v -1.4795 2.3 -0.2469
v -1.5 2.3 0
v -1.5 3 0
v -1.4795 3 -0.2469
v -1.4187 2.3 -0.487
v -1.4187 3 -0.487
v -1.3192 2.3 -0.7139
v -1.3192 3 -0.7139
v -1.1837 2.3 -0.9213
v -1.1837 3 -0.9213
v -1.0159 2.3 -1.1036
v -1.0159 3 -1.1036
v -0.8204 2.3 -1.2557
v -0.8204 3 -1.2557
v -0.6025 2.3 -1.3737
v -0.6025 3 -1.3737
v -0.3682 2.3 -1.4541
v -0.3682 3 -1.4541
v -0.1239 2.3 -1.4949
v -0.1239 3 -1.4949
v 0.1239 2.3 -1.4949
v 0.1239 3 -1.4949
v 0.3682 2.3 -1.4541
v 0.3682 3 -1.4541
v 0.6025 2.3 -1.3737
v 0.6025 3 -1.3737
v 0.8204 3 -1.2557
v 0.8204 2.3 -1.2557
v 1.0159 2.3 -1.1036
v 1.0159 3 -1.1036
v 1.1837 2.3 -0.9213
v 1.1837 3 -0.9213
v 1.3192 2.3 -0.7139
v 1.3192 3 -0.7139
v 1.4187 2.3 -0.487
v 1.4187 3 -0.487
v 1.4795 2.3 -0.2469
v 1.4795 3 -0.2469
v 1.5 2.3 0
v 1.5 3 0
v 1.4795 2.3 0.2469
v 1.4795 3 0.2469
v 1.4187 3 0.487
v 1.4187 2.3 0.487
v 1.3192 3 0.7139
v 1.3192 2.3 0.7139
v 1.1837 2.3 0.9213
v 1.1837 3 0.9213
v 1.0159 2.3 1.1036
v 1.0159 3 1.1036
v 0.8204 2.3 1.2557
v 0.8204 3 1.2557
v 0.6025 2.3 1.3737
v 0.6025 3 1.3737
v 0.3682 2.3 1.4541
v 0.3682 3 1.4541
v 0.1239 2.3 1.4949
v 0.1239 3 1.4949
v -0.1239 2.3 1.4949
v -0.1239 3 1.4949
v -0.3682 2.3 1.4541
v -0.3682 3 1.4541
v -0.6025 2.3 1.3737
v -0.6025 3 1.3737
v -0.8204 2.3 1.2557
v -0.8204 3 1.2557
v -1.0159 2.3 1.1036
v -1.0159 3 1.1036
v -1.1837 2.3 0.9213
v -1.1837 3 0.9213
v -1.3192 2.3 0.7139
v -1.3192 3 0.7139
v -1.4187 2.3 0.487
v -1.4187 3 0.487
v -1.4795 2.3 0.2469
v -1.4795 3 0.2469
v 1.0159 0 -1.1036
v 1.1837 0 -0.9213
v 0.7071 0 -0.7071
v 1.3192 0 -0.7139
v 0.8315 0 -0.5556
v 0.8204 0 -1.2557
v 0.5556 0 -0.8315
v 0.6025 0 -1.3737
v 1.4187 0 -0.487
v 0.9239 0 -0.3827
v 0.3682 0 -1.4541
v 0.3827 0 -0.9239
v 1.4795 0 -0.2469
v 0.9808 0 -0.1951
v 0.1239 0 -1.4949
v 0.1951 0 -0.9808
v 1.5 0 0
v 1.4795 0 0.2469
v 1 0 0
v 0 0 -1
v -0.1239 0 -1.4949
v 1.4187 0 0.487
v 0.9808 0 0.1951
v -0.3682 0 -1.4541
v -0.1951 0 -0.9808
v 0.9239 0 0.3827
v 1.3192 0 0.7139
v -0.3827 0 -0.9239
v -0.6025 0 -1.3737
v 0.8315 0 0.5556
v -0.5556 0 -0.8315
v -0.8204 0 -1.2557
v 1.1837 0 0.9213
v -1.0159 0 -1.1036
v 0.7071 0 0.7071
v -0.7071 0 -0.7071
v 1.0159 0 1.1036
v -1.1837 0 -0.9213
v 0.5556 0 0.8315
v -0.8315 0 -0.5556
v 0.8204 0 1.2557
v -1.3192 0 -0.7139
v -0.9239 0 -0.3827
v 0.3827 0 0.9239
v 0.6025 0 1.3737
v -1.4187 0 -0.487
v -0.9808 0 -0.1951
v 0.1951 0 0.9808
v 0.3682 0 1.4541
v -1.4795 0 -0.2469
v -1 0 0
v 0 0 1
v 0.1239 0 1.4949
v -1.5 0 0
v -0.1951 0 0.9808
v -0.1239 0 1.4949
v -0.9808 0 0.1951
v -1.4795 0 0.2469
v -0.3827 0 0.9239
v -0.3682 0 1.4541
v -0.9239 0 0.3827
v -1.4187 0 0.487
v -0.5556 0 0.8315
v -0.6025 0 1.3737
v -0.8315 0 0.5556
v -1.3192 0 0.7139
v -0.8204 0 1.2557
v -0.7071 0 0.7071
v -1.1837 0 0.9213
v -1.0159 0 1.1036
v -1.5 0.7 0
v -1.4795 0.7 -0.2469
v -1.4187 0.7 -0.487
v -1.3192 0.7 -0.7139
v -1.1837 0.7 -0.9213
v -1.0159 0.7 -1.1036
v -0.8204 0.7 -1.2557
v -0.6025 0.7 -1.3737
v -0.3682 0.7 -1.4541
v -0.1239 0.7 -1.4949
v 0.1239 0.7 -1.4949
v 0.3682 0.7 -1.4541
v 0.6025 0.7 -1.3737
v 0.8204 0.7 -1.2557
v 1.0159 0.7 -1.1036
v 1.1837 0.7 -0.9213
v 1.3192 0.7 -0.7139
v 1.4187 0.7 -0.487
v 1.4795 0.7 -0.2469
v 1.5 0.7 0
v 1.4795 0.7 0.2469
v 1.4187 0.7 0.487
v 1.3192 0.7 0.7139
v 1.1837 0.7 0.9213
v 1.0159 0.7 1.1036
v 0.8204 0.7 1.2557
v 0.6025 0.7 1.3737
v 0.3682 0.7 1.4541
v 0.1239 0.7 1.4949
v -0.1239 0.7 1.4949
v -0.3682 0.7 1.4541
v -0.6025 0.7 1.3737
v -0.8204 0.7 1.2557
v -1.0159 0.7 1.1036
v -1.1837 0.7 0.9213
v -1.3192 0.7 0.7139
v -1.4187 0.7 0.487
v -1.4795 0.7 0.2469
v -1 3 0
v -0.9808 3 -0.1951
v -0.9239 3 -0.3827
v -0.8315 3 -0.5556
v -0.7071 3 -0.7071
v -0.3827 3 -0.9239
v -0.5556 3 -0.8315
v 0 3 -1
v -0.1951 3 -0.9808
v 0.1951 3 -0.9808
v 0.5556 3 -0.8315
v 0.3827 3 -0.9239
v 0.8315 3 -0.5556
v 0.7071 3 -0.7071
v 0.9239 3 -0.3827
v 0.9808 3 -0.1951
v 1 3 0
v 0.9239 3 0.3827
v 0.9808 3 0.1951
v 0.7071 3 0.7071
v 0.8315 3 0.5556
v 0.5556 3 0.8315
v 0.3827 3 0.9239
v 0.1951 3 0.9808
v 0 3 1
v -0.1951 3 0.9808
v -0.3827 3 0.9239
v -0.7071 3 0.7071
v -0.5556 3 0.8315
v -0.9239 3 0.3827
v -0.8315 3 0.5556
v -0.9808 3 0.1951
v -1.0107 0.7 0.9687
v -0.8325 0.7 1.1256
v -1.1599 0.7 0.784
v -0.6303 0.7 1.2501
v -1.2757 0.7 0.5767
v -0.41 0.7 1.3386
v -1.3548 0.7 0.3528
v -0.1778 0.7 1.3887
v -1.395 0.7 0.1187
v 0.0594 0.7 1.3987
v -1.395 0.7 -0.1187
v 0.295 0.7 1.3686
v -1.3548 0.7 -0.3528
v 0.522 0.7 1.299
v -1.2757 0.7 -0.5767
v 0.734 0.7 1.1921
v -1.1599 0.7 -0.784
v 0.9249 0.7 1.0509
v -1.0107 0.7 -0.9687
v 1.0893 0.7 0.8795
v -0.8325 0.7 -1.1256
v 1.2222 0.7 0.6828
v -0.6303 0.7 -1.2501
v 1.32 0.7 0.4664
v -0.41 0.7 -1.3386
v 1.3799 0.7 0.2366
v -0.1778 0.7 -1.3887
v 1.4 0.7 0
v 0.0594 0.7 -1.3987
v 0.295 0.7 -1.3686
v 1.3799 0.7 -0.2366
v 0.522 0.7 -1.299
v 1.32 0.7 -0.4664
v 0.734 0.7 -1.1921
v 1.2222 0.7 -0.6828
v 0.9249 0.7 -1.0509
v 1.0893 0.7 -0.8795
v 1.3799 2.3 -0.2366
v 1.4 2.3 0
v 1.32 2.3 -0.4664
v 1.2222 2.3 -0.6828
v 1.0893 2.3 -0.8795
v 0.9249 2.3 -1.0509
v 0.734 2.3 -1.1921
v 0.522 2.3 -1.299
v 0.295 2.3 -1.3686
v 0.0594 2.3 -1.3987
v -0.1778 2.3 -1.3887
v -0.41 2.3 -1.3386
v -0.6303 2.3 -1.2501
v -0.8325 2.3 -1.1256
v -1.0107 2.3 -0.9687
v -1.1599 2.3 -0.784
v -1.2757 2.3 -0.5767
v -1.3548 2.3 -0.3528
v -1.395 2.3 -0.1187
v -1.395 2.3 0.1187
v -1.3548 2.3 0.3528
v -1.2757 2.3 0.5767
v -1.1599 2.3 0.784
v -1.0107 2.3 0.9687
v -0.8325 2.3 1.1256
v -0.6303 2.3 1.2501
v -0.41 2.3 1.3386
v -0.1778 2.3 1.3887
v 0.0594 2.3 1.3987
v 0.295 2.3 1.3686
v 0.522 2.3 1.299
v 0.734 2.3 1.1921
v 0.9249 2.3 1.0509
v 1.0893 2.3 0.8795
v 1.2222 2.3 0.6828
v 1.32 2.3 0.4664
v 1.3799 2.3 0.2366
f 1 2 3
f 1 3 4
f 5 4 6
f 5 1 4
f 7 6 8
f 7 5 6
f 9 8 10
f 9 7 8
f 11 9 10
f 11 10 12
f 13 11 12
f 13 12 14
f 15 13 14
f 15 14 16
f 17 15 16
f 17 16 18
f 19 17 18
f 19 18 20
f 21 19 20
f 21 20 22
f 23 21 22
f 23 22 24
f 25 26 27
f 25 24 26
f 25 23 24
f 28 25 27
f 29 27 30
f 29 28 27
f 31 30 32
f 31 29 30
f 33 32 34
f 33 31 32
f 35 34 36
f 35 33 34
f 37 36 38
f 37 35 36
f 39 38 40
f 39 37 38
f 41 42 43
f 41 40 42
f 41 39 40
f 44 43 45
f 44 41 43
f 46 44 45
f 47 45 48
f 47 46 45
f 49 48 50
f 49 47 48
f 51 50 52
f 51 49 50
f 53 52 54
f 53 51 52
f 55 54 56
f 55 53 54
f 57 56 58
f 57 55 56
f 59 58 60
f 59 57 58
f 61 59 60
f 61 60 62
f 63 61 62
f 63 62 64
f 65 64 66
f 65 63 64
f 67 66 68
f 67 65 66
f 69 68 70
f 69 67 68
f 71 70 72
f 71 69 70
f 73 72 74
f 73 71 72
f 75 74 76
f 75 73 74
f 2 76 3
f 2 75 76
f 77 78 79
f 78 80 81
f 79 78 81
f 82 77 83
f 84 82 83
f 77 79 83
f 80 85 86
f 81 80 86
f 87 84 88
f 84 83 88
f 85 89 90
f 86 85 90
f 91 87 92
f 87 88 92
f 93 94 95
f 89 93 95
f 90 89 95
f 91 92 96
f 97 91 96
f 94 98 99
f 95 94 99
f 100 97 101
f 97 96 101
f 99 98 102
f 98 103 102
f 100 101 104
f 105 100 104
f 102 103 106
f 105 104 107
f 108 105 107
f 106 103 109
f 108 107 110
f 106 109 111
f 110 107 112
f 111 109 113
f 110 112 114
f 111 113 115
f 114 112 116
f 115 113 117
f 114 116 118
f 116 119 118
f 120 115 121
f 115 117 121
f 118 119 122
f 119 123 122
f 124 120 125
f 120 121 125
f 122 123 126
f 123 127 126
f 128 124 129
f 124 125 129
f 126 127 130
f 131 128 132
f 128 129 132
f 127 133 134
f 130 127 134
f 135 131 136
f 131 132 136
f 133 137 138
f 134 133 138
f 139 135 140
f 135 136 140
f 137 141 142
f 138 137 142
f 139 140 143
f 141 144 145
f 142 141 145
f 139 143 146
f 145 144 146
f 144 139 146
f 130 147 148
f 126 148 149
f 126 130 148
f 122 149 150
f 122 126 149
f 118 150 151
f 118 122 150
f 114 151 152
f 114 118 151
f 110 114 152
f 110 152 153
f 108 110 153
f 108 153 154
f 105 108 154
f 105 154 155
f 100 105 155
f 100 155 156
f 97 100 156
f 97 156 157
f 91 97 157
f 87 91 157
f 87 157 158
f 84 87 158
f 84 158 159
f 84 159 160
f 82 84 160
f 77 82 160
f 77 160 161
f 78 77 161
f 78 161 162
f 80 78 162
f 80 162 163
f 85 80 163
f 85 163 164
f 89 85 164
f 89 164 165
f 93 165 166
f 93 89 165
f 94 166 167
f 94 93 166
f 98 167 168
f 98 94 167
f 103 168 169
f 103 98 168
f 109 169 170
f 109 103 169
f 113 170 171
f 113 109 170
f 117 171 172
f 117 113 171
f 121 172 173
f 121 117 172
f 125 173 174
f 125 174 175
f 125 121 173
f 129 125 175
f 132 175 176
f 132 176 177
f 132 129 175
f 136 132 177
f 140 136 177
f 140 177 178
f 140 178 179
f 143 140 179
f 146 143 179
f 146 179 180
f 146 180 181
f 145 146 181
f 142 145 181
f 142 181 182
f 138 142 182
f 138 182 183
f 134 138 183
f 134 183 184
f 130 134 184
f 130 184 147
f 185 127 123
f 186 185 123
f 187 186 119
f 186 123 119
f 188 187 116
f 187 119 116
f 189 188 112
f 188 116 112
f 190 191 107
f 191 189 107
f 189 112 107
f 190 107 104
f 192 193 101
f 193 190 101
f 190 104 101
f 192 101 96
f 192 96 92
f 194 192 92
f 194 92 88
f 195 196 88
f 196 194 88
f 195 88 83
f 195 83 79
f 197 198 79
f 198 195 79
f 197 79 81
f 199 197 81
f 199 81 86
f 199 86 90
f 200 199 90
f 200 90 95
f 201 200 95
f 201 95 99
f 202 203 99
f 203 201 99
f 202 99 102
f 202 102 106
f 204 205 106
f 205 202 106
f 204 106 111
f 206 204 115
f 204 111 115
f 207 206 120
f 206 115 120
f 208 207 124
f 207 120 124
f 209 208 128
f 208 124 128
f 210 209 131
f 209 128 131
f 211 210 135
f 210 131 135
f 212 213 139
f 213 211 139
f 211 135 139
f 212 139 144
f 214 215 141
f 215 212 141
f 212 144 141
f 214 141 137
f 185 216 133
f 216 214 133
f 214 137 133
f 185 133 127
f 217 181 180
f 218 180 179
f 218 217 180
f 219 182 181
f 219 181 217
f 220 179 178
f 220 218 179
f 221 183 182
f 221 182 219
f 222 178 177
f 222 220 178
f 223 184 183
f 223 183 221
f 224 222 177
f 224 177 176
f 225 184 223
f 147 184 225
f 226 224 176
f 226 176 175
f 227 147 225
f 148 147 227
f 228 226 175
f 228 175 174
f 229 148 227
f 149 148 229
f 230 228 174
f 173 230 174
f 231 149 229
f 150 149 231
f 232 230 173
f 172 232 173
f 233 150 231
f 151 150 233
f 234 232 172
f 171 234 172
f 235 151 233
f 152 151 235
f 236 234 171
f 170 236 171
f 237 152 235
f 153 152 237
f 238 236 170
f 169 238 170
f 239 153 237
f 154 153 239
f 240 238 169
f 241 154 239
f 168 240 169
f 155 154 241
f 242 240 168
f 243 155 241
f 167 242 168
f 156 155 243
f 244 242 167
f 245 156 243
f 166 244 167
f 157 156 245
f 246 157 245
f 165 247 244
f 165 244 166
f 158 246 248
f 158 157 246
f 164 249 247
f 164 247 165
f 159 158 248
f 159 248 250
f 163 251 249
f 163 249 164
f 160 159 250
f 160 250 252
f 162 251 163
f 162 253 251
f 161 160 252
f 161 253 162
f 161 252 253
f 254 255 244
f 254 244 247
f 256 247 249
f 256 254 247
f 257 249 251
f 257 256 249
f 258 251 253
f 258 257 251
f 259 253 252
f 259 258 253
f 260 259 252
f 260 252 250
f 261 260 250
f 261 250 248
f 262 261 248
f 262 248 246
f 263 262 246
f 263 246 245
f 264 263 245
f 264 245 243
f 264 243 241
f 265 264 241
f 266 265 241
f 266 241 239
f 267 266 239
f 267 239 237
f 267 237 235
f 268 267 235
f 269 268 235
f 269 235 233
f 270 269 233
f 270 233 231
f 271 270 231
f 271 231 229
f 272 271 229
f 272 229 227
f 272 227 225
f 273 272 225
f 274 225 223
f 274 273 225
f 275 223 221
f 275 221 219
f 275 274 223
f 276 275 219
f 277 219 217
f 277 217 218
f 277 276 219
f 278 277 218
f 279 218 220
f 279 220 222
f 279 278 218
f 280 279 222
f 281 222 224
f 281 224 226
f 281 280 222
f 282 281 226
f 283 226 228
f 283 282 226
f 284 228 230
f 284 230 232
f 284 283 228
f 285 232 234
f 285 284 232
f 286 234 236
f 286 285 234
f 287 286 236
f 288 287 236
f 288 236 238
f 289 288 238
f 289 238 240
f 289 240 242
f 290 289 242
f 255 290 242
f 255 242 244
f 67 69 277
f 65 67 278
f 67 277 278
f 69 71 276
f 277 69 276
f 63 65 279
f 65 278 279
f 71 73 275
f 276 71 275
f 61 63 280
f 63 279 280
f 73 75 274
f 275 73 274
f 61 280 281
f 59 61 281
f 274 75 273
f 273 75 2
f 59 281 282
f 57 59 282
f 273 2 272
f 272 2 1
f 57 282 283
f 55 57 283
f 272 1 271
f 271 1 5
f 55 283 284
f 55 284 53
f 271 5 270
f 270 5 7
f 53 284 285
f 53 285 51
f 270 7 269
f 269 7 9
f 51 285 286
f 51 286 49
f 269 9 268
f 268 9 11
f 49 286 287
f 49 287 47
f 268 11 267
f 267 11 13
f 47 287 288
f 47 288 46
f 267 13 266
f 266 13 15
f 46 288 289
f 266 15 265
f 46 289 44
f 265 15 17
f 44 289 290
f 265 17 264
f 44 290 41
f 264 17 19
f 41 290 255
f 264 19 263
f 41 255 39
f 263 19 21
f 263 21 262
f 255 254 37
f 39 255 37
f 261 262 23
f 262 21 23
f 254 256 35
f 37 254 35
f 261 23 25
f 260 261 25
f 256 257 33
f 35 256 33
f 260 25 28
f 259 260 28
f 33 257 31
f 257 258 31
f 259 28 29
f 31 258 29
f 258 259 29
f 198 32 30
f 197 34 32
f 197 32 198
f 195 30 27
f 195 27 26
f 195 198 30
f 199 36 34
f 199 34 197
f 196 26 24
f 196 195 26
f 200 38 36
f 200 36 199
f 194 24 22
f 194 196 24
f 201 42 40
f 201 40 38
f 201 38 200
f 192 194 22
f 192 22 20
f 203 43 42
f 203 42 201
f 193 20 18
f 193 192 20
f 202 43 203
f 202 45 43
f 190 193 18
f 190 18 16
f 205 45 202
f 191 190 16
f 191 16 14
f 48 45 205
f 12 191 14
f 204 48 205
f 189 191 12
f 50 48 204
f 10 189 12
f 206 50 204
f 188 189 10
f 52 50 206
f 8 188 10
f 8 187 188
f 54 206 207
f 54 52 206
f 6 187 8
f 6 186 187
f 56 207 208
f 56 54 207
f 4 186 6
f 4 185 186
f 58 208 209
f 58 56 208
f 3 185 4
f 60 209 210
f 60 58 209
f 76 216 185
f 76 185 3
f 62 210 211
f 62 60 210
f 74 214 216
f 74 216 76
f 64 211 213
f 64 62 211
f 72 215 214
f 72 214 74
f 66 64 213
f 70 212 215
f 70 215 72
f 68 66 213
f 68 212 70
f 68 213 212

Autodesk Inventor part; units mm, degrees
ref_plane "YZ Plane" through (0, 0, 0) normal (1, 0, 0) x (0, 1, 0)
ref_plane "XZ Plane" through (0, 0, 0) normal (0, 1, 0) x (-1, 0, 0)
ref_plane "XY Plane" through (0, 0, 0) normal (0, 0, 1) x (1, 0, 0)
sketch "Sketch1" plane through (0, 0, 0) normal (0, 1, 0) x (-1, 0, 0)
  circle A0 centre (0, 0) radius 1.5
  circle A1 centre (0, 0) radius 1
  dimension "d0" = 3
  dimension "d1" = 2
extrude "Extrusion1" add sketch "Sketch1" along normal blind 3
ref_plane "Work Plane1" through (0, 2.3, 0) normal (0, 1, 0) x (1, 0, 0)
sketch "Sketch2" plane through (0, 2.3, 0) normal (0, 1, 0) x (1, 0, 0)
  circle A0 centre (0, 0) radius 1.5 projected
  circle A1 centre (0, 0) radius 1 projected
  circle A2 centre (0, 0) radius 1.4
  dimension "d5" = 2.8
extrude "Extrusion2" cut sketch "Sketch2" against normal blind 1.6 contours A0
properties part number "screw_holder_2_3"
